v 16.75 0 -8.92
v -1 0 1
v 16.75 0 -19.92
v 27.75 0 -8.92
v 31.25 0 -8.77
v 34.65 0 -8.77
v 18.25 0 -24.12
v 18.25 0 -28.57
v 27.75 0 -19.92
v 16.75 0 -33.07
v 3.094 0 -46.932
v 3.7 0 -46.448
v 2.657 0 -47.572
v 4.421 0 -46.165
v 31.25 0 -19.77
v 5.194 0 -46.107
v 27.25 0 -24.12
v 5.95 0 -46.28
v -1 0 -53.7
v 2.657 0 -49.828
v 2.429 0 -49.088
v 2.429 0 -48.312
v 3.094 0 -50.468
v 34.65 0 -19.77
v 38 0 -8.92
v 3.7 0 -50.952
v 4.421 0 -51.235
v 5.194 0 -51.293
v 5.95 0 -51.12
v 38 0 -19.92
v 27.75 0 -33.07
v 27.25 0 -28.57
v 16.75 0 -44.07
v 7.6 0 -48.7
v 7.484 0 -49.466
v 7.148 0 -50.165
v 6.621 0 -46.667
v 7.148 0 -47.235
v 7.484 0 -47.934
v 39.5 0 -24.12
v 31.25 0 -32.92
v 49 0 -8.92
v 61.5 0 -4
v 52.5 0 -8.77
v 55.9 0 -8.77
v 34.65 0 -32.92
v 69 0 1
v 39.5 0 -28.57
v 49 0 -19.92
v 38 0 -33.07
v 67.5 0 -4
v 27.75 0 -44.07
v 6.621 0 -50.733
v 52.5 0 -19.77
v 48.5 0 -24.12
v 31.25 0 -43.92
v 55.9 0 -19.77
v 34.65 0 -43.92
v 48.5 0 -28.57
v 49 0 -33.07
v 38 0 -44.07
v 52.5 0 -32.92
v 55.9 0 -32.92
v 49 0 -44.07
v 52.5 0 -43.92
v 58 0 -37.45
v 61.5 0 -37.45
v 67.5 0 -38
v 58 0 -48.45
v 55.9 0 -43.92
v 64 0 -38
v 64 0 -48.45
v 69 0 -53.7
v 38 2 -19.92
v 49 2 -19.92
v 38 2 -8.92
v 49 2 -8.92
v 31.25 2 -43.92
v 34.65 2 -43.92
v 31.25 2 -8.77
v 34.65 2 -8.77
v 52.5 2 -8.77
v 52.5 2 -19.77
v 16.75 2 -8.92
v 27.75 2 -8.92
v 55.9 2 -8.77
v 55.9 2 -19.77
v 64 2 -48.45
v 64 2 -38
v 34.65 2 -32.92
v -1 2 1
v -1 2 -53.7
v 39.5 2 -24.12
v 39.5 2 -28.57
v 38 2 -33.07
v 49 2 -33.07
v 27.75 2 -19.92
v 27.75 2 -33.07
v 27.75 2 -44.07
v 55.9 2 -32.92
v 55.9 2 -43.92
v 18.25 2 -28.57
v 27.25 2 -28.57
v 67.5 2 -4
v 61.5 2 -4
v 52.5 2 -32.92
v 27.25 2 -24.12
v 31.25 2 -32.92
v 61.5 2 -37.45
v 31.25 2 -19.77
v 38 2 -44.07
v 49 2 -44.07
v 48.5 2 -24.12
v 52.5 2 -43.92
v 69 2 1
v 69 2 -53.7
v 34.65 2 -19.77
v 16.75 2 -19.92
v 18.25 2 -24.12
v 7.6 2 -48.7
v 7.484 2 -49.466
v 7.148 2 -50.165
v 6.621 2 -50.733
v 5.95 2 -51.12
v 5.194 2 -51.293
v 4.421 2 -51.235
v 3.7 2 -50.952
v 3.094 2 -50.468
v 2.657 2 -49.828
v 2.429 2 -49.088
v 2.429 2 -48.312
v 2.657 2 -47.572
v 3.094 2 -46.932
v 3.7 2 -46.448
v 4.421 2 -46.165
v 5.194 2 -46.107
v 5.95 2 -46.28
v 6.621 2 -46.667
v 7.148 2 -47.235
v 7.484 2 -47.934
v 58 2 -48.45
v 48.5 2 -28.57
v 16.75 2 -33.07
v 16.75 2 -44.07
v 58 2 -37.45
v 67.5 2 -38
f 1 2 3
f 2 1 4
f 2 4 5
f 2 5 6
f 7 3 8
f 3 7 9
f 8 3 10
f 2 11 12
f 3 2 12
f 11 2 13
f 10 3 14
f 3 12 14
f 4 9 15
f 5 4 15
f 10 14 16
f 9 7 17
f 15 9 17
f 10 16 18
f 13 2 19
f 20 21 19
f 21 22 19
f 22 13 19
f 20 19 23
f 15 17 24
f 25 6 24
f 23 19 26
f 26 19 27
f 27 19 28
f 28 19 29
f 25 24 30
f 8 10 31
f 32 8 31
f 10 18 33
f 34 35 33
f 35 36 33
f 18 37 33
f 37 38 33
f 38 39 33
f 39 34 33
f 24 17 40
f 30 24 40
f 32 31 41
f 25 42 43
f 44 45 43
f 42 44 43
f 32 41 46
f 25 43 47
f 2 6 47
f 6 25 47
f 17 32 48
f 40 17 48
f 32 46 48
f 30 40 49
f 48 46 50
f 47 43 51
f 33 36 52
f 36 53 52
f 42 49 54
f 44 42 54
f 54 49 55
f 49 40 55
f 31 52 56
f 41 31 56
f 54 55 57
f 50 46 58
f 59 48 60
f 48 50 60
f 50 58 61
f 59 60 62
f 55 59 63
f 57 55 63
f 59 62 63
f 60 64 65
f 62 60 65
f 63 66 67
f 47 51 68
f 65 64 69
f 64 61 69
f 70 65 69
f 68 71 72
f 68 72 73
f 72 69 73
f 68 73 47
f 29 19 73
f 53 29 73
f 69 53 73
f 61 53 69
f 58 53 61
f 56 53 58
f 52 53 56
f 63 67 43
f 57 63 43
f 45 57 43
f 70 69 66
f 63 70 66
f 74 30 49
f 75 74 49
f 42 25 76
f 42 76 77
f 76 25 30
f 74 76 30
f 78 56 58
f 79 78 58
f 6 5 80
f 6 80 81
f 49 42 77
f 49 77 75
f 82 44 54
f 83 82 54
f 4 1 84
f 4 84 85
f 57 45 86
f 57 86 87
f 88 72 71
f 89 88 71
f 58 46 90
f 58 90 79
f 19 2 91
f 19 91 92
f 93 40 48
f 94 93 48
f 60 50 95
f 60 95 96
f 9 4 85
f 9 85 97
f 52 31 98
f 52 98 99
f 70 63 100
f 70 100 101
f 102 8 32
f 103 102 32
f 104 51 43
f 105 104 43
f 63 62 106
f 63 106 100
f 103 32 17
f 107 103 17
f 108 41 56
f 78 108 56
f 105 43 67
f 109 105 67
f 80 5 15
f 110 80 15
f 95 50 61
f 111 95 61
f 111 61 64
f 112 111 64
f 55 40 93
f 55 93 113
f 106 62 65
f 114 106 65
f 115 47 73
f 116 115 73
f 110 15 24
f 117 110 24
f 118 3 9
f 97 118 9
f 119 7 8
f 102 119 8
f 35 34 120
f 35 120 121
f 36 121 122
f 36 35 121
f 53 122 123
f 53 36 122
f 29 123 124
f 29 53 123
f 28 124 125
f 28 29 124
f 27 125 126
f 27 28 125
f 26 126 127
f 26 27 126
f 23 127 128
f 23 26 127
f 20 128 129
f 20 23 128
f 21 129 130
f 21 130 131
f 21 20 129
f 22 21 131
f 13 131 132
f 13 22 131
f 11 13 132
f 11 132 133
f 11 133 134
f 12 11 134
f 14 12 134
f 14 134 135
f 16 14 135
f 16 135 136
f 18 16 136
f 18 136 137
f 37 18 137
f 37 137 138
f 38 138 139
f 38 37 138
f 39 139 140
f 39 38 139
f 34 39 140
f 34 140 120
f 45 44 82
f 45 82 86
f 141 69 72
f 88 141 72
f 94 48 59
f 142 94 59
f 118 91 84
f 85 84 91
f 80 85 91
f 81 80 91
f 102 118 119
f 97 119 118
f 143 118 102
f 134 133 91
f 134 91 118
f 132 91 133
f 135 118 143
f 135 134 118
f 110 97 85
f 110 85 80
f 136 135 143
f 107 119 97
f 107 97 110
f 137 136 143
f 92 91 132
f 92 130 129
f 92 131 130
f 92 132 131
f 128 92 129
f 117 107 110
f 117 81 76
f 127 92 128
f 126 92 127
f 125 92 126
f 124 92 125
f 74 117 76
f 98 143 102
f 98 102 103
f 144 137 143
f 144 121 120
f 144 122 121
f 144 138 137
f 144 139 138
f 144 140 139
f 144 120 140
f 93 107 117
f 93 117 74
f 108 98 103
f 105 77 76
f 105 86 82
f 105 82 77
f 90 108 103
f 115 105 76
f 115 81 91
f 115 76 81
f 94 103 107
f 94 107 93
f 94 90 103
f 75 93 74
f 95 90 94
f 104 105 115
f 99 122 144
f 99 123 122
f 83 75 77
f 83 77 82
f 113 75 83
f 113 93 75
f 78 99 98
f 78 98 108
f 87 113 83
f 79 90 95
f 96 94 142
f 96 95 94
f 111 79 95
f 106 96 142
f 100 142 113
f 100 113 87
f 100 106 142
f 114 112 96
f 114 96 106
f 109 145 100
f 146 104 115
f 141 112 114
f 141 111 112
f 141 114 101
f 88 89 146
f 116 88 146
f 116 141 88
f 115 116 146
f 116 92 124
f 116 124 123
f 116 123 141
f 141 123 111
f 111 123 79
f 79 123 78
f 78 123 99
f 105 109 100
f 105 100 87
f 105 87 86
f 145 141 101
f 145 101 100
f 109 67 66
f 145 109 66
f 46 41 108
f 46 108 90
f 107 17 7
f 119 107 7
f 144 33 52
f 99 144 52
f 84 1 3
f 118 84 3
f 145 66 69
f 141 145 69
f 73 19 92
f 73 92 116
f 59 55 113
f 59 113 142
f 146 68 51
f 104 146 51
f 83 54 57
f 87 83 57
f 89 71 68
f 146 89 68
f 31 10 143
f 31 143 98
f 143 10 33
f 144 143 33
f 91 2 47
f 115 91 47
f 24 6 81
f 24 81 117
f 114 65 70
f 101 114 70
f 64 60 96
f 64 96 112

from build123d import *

# Parameters (mm, degrees)
SKETCH2_W           = 70
SKETCH2_H           = 54.7
SKETCH2_W_2         = 11
SKETCH2_H_2         = 11
SKETCH2_W_3         = 3.4
SKETCH2_W_4         = 9
SKETCH2_H_3         = 4.45
SKETCH2_R           = 2.6
BOSS_EXTRUDE1_DEPTH = 2


with BuildPart() as part:
    # Sketch2 → Boss-Extrude1 (new body)
    with BuildSketch(Plane(origin=(0, 0, 0), x_dir=(1, 0, 0), z_dir=(0, 1, 0))):
        with Locations((34, 26.35)):
            Rectangle(SKETCH2_W, SKETCH2_H)
        with Locations((22.25, 14.42)):
            Rectangle(SKETCH2_W_2, SKETCH2_H_2, mode=Mode.SUBTRACT)
        with Locations((32.95, 14.27)):
            Rectangle(SKETCH2_W_3, SKETCH2_H_2, mode=Mode.SUBTRACT)
        Polygon((18.25, 28.57), (22.75, 28.57), (27.25, 28.57), (27.25, 24.12), (22.75, 24.12), (18.25, 24.12), align=None, mode=Mode.SUBTRACT)
        with Locations((43.5, 14.42)):
            Rectangle(SKETCH2_W_2, SKETCH2_H_2, mode=Mode.SUBTRACT)
        with Locations((44, 26.345)):
            Rectangle(SKETCH2_W_4, SKETCH2_H_3, mode=Mode.SUBTRACT)
        with Locations((54.2, 14.27)):
            Rectangle(SKETCH2_W_3, SKETCH2_H_2, mode=Mode.SUBTRACT)
        Polygon((67.5, 4), (61.5, 4), (61.5, 37.45), (58, 37.45), (58, 48.45), (64, 48.45), (64, 38), (67.5, 38), align=None, mode=Mode.SUBTRACT)
        with Locations((22.25, 38.57)):
            Rectangle(SKETCH2_W_2, SKETCH2_H_2, mode=Mode.SUBTRACT)
        with Locations((32.95, 38.42)):
            Rectangle(SKETCH2_W_3, SKETCH2_H_2, mode=Mode.SUBTRACT)
        with Locations((5, 48.7)):
            Circle(SKETCH2_R, mode=Mode.SUBTRACT)
        with Locations((43.5, 38.57)):
            Rectangle(SKETCH2_W_2, SKETCH2_H_2, mode=Mode.SUBTRACT)
        with Locations((54.2, 38.42)):
            Rectangle(SKETCH2_W_3, SKETCH2_H_2, mode=Mode.SUBTRACT)
    extrude(amount=BOSS_EXTRUDE1_DEPTH)


solid = part.part
